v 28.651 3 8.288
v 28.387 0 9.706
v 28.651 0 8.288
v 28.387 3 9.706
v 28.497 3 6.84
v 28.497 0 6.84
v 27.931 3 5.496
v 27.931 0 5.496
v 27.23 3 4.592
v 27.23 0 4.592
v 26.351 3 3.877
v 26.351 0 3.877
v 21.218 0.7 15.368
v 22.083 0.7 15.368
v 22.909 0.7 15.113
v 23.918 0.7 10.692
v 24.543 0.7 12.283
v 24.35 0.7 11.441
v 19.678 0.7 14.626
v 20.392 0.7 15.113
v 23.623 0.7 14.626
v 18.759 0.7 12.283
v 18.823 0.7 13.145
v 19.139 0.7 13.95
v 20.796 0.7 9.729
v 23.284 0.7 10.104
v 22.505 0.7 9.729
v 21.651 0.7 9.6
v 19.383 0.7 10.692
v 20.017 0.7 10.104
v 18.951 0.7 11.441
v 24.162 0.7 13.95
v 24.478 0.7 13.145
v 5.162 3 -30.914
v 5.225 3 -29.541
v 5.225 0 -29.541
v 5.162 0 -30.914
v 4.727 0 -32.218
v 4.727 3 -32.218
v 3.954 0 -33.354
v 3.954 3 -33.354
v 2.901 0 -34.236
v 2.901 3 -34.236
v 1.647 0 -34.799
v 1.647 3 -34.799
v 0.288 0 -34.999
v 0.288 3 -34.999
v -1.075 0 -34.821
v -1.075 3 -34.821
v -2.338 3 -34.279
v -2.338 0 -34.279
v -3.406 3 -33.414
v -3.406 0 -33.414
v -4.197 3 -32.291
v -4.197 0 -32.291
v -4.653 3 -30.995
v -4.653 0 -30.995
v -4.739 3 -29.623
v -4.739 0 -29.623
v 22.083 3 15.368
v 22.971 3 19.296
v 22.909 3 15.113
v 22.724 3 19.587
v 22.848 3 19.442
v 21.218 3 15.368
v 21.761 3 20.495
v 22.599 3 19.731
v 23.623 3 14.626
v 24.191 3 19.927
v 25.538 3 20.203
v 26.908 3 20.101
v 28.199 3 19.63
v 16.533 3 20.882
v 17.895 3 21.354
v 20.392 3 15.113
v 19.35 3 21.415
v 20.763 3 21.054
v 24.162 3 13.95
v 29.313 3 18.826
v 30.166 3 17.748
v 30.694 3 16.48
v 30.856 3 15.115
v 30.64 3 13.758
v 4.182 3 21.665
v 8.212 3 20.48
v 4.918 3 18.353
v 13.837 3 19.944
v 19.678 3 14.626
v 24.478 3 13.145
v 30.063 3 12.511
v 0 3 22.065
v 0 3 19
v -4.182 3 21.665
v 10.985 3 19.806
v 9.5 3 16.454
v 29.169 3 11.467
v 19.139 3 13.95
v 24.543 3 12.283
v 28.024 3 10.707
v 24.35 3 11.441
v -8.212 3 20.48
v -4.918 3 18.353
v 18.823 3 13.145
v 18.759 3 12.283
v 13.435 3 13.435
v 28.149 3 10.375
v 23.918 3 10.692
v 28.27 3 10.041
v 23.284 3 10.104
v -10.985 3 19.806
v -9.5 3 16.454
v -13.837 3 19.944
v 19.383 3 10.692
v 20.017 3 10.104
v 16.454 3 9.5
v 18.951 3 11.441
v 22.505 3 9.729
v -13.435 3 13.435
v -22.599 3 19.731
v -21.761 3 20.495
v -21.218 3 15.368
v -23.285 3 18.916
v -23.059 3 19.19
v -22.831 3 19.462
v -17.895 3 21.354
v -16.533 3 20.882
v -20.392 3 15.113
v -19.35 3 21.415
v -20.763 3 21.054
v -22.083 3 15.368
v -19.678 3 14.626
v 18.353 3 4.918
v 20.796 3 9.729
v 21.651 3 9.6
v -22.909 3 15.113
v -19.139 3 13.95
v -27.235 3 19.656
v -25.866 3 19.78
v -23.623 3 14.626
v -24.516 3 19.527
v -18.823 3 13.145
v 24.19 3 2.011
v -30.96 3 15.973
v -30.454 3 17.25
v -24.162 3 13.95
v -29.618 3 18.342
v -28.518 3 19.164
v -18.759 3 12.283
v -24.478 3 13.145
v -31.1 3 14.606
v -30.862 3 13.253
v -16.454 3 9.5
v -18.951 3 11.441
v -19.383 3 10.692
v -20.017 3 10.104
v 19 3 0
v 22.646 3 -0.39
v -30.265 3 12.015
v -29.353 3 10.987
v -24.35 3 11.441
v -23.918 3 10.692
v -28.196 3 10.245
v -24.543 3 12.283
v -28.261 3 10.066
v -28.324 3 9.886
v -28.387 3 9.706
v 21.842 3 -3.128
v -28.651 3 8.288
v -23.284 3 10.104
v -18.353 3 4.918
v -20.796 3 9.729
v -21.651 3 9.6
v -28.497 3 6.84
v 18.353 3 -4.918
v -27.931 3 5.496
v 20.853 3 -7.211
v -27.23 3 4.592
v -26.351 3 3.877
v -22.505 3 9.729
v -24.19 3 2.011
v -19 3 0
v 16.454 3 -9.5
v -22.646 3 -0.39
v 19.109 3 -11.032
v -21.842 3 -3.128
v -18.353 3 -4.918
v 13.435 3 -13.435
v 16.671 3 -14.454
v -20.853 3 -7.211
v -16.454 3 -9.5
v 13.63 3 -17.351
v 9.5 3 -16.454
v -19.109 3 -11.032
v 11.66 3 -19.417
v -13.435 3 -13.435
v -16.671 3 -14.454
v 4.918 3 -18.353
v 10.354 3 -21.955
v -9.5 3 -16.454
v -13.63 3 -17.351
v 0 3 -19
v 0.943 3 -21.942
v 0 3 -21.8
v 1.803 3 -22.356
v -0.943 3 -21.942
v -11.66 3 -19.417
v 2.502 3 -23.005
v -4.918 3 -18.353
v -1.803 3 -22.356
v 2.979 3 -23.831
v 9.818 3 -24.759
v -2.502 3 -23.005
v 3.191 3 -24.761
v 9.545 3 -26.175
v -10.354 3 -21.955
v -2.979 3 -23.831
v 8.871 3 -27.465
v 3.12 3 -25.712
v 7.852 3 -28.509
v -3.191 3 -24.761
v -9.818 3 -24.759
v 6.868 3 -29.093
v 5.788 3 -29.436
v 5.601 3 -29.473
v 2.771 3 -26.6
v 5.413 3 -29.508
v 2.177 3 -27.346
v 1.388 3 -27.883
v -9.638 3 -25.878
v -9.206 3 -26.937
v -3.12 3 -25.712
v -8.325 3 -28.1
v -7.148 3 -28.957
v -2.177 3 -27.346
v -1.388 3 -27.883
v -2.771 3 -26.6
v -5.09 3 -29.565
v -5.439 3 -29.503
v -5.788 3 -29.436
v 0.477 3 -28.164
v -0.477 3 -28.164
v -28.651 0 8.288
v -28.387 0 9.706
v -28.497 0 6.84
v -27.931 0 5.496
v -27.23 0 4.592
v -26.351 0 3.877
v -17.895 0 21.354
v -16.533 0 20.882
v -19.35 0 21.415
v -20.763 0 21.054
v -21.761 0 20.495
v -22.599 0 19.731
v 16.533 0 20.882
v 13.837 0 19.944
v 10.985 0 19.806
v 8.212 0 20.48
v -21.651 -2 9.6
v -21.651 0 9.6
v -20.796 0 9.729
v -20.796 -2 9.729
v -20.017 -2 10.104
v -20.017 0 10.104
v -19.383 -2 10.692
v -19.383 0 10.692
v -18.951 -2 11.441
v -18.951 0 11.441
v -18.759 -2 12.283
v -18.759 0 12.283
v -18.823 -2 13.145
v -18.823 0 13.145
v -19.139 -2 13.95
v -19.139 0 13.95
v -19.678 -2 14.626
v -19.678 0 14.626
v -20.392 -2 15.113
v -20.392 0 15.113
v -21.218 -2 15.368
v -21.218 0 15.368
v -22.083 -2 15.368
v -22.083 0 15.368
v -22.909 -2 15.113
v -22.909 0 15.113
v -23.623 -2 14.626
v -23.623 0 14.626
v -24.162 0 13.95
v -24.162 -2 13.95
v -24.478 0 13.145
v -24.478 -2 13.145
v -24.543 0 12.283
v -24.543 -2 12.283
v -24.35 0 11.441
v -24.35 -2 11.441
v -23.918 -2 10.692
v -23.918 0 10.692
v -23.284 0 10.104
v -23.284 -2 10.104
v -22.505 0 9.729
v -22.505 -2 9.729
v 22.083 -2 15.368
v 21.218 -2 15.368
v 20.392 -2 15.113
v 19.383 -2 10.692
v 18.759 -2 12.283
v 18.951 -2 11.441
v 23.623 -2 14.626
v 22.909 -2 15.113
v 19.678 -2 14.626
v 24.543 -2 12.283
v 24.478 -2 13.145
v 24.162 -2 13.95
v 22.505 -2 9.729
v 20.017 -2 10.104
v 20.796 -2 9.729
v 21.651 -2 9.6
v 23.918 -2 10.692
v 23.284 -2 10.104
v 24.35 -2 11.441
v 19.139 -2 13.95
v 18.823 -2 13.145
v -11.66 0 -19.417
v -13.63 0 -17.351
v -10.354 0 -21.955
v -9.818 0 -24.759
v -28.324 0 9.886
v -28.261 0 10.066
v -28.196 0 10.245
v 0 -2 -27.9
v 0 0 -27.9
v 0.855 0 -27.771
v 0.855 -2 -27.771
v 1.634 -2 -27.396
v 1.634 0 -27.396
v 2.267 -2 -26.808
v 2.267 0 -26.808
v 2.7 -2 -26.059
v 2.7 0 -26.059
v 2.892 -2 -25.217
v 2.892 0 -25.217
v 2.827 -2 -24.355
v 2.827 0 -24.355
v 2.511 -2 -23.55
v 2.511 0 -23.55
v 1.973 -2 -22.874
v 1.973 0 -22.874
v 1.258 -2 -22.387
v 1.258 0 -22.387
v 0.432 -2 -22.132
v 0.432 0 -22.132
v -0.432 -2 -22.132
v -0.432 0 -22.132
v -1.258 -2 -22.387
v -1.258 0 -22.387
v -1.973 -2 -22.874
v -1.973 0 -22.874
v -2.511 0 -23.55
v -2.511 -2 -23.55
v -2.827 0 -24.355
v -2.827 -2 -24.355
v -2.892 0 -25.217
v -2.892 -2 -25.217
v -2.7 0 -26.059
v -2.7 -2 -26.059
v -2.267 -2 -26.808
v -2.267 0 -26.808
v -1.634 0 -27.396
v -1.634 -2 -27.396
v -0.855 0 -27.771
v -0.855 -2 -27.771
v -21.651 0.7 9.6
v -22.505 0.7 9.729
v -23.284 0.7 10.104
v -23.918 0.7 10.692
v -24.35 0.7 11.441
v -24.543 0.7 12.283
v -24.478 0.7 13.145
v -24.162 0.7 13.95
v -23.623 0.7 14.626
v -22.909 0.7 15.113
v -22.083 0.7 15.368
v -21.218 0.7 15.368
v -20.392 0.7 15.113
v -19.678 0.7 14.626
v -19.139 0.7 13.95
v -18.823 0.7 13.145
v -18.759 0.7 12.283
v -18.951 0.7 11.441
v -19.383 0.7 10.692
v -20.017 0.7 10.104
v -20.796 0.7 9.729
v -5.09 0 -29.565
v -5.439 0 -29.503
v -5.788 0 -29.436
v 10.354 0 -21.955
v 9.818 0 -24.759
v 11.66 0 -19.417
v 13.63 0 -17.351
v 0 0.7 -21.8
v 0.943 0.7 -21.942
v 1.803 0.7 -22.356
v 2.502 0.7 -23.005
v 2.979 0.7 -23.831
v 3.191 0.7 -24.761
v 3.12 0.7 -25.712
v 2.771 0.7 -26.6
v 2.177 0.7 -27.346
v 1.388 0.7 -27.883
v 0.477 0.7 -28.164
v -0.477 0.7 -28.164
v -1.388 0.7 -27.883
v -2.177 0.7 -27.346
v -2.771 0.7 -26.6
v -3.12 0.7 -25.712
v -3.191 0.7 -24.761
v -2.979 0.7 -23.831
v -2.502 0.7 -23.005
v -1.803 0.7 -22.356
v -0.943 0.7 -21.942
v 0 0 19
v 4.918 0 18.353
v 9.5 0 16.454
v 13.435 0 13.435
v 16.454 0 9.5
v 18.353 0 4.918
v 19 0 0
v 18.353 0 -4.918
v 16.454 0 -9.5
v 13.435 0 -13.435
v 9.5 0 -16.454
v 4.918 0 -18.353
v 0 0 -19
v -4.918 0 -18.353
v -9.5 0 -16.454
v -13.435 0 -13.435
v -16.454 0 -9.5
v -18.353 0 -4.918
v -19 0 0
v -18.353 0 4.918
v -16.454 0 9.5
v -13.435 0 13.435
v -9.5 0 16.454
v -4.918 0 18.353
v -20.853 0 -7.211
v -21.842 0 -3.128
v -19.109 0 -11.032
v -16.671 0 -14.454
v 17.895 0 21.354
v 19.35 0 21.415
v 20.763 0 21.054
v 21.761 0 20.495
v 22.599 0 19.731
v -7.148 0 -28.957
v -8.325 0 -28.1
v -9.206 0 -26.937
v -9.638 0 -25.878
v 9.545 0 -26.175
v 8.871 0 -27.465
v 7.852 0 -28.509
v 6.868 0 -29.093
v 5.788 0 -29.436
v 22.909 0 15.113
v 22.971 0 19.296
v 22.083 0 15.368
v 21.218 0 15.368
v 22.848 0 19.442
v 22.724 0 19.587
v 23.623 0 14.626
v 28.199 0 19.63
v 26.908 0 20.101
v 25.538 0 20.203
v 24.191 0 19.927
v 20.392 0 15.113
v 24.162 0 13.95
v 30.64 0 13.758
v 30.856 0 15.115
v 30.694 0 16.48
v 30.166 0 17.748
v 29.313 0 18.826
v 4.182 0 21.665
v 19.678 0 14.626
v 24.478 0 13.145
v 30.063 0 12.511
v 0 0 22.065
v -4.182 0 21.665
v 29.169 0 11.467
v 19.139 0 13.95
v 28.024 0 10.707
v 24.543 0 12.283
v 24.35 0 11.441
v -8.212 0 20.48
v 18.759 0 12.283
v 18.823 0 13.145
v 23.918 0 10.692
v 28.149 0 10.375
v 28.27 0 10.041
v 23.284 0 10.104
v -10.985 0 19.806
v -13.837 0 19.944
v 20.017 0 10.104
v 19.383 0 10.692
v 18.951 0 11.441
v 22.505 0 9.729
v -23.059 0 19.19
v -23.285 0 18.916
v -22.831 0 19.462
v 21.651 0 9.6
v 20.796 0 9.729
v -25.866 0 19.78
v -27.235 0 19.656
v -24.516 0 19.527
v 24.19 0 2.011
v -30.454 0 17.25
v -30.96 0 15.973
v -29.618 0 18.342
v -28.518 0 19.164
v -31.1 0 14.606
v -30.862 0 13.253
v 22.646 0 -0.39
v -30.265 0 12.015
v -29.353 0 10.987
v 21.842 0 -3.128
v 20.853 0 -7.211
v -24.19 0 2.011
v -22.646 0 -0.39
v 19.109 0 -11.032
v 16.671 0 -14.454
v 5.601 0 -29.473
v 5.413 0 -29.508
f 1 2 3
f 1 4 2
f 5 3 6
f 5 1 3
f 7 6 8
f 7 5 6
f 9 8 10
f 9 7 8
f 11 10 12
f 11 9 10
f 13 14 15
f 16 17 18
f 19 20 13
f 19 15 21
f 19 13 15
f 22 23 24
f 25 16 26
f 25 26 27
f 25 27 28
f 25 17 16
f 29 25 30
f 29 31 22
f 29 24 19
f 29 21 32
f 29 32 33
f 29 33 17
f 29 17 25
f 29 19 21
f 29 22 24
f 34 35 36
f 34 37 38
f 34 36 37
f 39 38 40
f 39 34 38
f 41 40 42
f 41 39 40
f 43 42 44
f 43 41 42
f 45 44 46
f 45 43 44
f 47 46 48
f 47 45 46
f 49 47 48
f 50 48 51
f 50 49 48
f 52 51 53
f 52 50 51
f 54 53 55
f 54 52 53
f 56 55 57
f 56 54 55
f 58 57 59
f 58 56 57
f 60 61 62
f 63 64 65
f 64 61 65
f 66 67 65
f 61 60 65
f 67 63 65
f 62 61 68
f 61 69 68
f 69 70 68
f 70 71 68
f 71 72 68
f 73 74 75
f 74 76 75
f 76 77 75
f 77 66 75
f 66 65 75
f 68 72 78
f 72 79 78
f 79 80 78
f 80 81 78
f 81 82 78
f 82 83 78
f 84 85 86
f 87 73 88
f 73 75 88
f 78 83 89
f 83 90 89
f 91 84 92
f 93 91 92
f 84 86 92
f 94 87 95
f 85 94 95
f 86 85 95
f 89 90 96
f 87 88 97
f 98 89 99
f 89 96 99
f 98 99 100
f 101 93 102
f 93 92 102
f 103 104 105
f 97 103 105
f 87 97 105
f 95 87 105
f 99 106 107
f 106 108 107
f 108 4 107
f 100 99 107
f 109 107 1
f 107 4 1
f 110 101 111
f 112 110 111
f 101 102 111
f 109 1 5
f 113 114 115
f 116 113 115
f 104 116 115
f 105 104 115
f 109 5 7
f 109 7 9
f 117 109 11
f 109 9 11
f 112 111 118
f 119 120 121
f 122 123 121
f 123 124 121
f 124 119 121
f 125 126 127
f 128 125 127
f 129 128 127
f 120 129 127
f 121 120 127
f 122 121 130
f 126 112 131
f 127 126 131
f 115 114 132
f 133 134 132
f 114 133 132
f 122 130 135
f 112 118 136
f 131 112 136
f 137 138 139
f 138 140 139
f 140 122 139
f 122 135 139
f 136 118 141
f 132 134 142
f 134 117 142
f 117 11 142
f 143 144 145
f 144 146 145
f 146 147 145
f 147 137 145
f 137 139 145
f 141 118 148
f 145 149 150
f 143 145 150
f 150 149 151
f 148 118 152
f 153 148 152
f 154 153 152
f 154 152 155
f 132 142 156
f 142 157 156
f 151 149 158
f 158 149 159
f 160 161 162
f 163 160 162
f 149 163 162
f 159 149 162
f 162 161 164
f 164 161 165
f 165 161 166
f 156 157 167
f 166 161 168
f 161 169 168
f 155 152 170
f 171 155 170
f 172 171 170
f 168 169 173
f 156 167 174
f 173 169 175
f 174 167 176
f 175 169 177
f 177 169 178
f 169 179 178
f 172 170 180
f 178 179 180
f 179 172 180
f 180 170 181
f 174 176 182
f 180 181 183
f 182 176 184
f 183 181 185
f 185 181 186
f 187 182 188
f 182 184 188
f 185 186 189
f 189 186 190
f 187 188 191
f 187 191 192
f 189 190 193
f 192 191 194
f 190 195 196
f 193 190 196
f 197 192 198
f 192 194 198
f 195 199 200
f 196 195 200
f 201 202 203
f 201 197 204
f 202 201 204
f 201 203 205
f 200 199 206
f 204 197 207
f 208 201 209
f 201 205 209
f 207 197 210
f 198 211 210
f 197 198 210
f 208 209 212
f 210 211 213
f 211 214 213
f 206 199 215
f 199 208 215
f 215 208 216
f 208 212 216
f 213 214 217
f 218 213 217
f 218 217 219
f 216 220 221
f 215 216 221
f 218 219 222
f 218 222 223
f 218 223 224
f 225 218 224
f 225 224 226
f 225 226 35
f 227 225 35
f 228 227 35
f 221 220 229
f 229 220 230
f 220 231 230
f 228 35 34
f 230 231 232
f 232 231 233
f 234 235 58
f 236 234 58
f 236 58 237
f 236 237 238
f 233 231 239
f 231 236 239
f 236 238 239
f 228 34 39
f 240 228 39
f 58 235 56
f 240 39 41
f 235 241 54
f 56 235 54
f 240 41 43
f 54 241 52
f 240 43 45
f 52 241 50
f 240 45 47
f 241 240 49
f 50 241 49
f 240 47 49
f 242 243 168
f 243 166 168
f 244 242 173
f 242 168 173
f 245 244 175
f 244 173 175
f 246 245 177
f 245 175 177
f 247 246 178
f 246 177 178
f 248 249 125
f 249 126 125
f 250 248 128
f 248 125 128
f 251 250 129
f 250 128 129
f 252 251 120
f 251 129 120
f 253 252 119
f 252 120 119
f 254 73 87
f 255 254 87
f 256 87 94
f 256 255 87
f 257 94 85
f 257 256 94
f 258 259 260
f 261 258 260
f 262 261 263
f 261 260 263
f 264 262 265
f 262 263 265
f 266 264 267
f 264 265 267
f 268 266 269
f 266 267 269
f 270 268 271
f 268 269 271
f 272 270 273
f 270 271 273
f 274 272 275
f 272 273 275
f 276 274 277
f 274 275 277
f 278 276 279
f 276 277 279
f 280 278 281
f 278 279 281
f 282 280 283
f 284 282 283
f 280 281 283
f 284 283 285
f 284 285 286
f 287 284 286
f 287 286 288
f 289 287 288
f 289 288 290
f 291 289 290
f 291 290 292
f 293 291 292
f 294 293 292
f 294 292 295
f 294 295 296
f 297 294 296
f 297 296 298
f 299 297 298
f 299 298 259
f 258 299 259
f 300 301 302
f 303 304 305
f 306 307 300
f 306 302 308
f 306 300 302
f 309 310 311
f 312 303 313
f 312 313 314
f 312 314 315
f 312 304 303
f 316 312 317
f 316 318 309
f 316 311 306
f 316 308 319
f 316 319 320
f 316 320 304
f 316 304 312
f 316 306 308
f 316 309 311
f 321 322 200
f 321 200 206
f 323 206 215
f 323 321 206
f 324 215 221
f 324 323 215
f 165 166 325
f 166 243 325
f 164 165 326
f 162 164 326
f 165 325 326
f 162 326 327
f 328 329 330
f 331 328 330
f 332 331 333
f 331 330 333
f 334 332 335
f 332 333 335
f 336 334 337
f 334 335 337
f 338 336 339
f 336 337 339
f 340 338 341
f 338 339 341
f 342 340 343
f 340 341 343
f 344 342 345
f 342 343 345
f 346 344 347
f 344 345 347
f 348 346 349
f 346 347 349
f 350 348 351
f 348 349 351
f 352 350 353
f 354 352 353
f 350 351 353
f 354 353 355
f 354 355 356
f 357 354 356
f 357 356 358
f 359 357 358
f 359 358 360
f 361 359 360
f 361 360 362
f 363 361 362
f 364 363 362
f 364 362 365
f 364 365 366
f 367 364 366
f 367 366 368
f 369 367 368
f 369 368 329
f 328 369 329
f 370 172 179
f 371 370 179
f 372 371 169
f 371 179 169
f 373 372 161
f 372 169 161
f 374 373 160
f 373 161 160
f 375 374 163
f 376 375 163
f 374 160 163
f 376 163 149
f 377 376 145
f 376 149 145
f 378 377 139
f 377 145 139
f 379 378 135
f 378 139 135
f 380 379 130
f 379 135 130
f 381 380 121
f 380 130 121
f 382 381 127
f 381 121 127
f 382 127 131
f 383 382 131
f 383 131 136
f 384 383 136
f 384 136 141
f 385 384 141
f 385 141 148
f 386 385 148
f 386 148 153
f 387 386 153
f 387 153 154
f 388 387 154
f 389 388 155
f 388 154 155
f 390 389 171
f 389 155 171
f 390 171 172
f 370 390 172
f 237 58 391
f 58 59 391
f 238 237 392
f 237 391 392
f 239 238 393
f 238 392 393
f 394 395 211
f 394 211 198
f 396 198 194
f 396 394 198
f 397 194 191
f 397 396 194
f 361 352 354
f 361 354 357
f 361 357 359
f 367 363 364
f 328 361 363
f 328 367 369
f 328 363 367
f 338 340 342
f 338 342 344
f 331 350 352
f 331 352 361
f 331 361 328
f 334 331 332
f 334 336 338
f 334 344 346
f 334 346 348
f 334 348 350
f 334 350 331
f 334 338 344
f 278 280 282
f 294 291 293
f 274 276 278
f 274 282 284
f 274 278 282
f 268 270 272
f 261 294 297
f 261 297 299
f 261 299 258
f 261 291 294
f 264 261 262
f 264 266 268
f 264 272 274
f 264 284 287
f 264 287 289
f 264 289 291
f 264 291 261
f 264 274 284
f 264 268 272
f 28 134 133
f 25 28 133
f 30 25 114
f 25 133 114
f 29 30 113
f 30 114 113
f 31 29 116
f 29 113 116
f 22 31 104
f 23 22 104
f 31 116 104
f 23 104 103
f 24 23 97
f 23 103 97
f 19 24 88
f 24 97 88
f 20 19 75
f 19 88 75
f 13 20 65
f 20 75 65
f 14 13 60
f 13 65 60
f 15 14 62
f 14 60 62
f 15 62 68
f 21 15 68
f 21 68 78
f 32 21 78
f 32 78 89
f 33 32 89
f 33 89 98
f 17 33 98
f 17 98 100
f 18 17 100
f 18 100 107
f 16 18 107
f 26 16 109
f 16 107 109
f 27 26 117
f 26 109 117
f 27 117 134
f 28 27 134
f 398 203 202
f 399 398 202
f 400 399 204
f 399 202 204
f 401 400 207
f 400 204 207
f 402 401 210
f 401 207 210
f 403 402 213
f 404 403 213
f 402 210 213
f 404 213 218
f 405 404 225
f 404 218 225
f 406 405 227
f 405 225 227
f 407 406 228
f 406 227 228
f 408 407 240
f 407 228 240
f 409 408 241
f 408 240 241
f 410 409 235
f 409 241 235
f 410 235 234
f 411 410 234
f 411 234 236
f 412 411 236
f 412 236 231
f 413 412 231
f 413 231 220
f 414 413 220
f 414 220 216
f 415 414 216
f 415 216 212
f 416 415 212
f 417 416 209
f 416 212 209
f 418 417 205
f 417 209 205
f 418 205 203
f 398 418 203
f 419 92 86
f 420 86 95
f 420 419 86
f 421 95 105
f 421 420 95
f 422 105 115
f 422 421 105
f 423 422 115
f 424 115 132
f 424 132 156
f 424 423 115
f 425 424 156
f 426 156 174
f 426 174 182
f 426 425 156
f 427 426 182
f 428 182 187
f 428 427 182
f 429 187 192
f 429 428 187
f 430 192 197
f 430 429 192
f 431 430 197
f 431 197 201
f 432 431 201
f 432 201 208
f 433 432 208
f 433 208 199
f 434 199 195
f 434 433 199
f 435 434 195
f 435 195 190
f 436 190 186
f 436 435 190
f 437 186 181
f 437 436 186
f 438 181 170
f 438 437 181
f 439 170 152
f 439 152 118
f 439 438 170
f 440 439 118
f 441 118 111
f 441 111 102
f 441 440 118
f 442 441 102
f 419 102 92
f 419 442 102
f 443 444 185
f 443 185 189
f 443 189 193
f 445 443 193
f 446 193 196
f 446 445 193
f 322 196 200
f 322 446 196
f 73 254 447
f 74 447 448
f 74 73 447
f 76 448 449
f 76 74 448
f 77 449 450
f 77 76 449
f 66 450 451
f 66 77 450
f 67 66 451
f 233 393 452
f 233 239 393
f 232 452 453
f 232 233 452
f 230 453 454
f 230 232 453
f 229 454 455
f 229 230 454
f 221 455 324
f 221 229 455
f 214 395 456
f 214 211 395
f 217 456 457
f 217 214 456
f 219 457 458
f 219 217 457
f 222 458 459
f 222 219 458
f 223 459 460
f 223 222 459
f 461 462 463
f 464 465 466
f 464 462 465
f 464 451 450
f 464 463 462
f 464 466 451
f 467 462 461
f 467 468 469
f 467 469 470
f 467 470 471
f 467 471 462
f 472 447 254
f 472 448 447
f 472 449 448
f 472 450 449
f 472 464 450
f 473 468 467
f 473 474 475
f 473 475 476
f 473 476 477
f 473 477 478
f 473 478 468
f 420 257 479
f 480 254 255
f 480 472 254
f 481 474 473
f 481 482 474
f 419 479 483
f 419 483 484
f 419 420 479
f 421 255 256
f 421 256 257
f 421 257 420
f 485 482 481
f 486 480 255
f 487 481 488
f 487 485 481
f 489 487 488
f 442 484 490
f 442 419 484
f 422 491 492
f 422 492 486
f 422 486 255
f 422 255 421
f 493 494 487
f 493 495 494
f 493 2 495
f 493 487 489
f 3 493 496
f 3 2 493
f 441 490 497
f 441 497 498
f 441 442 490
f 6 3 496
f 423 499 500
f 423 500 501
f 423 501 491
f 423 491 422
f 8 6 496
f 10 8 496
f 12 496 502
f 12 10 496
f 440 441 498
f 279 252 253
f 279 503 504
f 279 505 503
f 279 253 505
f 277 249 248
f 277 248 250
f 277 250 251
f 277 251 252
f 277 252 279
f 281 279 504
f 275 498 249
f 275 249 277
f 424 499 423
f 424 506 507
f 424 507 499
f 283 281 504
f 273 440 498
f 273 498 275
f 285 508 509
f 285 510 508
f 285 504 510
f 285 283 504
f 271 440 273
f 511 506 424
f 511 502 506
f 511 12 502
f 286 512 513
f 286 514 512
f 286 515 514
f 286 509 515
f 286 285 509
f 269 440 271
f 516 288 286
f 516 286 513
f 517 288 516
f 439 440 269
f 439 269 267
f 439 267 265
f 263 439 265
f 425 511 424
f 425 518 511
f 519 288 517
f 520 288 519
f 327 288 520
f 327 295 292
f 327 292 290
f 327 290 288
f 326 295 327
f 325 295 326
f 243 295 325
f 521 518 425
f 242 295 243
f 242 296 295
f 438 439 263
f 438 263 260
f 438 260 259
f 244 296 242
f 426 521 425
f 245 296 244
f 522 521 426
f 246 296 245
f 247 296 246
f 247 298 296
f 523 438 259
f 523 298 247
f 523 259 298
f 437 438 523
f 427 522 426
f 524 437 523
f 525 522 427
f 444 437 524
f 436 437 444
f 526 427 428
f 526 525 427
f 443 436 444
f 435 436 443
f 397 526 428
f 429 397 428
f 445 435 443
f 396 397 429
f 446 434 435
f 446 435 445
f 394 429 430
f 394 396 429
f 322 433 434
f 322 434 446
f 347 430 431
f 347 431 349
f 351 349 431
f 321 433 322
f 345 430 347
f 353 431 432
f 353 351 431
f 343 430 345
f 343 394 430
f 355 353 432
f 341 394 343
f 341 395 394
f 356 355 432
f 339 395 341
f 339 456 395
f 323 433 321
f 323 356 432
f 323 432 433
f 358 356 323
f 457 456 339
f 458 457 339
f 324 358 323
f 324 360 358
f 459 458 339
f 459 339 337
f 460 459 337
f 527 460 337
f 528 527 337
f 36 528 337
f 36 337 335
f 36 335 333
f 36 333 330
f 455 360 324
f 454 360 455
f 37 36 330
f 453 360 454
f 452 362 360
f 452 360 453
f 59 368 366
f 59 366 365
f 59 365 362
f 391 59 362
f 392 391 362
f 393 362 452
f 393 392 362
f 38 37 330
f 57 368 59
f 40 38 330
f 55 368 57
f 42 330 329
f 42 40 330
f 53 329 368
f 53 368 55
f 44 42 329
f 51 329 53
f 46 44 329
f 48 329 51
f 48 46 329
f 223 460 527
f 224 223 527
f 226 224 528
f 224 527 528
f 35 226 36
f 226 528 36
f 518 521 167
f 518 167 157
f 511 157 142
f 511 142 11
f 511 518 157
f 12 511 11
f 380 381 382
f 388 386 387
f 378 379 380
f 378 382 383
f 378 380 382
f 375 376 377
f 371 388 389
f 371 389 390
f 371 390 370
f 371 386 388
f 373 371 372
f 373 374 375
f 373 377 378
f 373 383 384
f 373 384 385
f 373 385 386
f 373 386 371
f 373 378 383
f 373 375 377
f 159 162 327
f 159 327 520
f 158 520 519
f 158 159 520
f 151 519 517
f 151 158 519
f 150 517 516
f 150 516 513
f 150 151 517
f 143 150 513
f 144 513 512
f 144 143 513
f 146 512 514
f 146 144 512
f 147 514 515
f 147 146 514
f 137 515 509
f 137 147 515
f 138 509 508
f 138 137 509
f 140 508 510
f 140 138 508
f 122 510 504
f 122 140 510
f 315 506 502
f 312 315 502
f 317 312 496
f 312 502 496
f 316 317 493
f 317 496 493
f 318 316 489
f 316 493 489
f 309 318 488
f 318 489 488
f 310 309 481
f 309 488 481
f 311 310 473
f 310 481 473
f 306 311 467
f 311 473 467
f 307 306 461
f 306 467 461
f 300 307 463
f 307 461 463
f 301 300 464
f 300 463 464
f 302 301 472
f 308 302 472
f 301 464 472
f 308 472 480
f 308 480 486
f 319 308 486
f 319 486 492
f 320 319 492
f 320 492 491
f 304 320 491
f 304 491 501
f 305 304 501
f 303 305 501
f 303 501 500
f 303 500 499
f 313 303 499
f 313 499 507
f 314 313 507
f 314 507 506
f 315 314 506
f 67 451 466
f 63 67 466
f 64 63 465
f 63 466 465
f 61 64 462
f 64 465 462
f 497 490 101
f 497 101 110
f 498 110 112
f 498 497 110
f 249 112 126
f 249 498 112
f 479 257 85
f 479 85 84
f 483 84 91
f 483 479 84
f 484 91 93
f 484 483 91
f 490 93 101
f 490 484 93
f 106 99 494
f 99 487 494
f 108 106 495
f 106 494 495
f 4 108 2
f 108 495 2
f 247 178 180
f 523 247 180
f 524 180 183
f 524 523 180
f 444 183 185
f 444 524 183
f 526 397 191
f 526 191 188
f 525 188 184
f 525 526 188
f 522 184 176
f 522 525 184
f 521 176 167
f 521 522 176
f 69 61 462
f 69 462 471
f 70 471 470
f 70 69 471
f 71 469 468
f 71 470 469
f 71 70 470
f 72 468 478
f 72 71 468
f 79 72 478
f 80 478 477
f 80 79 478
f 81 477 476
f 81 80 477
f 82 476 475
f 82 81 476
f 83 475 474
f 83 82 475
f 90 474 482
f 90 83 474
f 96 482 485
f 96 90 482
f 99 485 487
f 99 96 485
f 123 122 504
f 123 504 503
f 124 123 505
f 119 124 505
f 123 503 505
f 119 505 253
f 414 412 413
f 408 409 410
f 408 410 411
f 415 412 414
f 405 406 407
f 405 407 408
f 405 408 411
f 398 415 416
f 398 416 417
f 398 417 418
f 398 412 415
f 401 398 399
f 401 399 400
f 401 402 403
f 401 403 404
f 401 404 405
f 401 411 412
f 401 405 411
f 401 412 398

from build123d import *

# Parameters (mm, degrees)
SKETCH1_R                = 19
BOSS_EXTRUDE1_DEPTH      = 3.5
SKETCH2_R                = 30
SKETCH2_R_2              = 19
SKETCH2_R_3              = 2.8
BOSS_EXTRUDE2_DEPTH      = 3
BOSS_EXTRUDE3_DEPTH      = 2
BOSS_EXTRUDE3_DEPTH_BACK = 3
SKETCH4_R                = 2.9
SKETCH5_R                = 5
BOSS_EXTRUDE4_DEPTH      = 3
CUT_EXTRUDE1_START       = -10
SKETCH3_R                = 19
CUT_EXTRUDE1_DEPTH       = 10
SKETCH6_R                = 3.2
SKETCH6_R_2              = 2.9
CUT_EXTRUDE2_DEPTH       = 2.3
CUT_EXTRUDE3_START       = -13
CUT_EXTRUDE3_DEPTH       = 13
FILLET1_R                = 10
FILLET2_R                = 5


with BuildPart() as part:
    # Sketch1 → Boss-Extrude1 (new body)
    with BuildSketch(Plane(origin=(0, 0, 0), x_dir=(1, 0, 0), z_dir=(0, 1, 0))):
        with Locations(Location((0, 0, 0), (0, 0, 270))):
            Circle(SKETCH1_R)
    extrude(amount=BOSS_EXTRUDE1_DEPTH)

    # Sketch2 → Boss-Extrude2 (add)
    with BuildSketch(Plane(origin=(0, 0, 0), x_dir=(1, 0, 0), z_dir=(0, 1, 0))):
        with Locations(Location((0, 0, 0), (0, 0, 270))):
            Circle(SKETCH2_R)
        with Locations(Location((0, 0, 0), (0, 0, 270))):
            Circle(SKETCH2_R_2, mode=Mode.SUBTRACT)
        with Locations(Location((0, 25, 0), (0, 0, 270))):
            Circle(SKETCH2_R_3, mode=Mode.SUBTRACT)
        with Locations(Location((21.650635095, -12.5, 0), (0, 0, 270))):
            Circle(SKETCH2_R_3, mode=Mode.SUBTRACT)
        with Locations(Location((-21.650635095, -12.5, 0), (0, 0, 270))):
            Circle(SKETCH2_R_3, mode=Mode.SUBTRACT)
    extrude(amount=BOSS_EXTRUDE2_DEPTH)

    # Sketch4 → Boss-Extrude3 (add, two sides: drawn at the far end of the back side and taken through both)
    with BuildSketch(Plane.XZ.offset(-BOSS_EXTRUDE3_DEPTH_BACK)):
        with Locations(Location((-21.650635095, 12.5, 0), (0, 0, 270))):
            Circle(SKETCH4_R)
        with Locations(Location((21.650635095, 12.5, 0), (0, 0, 270))):
            Circle(SKETCH4_R)
        with Locations(Location((0, -25, 0), (0, 0, 270))):
            Circle(SKETCH4_R)
    extrude(amount=BOSS_EXTRUDE3_DEPTH + BOSS_EXTRUDE3_DEPTH_BACK)

    # Sketch5 → Boss-Extrude4 (add)
    with BuildSketch(Plane(origin=(0, 3, 0), x_dir=(1, 0, 0), z_dir=(0, 1, 0))):
        with Locations((-26.103110985, -14.7860609)):
            Circle(SKETCH5_R)
        with Locations((0.246451131, 29.99898768)):
            Circle(SKETCH5_R)
        with Locations((25.856659853, -15.212926781)):
            Circle(SKETCH5_R)
    extrude(amount=-BOSS_EXTRUDE4_DEPTH)

    # Sketch3 → Cut-Extrude1 (cut)
    with BuildSketch(Plane(origin=(0, 3.5, 0), x_dir=(1, 0, 0), z_dir=(0, 1, 0)).offset(CUT_EXTRUDE1_START)):
        with Locations(Location((0, 0, 0), (0, 0, 270))):
            Circle(SKETCH3_R)
    extrude(amount=CUT_EXTRUDE1_DEPTH, mode=Mode.SUBTRACT)

    # Sketch6 → Cut-Extrude2 (cut)
    with BuildSketch(Plane(origin=(0, 3, 0), x_dir=(1, 0, 0), z_dir=(0, 1, 0))):
        with Locations(Location((0, 25, 0), (0, 0, 270))):
            Circle(SKETCH6_R)
        with Locations(Location((21.650635095, -12.5, 0), (0, 0, 90))):
            Circle(SKETCH6_R_2)
        with Locations(Location((-21.650635095, -12.5, 0), (0, 0, 90))):
            Circle(SKETCH6_R_2)
    extrude(amount=-CUT_EXTRUDE2_DEPTH, mode=Mode.SUBTRACT)

    # Sketch7 → Cut-Extrude3 (cut)
    with BuildSketch(Plane(origin=(0, 3, 0), x_dir=(1, 0, 0), z_dir=(0, 1, 0)).offset(CUT_EXTRUDE3_START)):
        with BuildLine():
            ThreePointArc((-29.54423259, -5.20944533), (-25.980762114, 15), (-10.2606043, 28.190778624))
            Line((-10.2606043, 28.190778624), (-13.773984089, 37.84371026))
            Line((-13.773984089, 37.84371026), (-43.939319858, -7.747687605))
            Line((-43.939319858, -7.747687605), (-29.54423259, -5.20944533))
        make_face()
        with BuildLine():
            ThreePointArc((-21.729408673, -3.831481024), (-19.108521295, 11.032309914), (-7.546544436, 20.733960432))
            Line((-7.546544436, 20.733960432), (-10.2606043, 28.190778624))
            ThreePointArc((-10.2606043, 28.190778624), (-25.980762114, 15), (-29.54423259, -5.20944533))
            Line((-29.54423259, -5.20944533), (-21.729408673, -3.831481024))
        make_face()
        with BuildLine():
            Line((15.259965643, 41.926411025), (10.2606043, 28.190778624))
            ThreePointArc((10.2606043, 28.190778624), (25.980762114, 15), (29.54423259, -5.20944533))
            Line((29.54423259, -5.20944533), (39.660606503, -6.993234998))
            Line((39.660606503, -6.993234998), (15.259965643, 41.926411025))
        make_face()
        with BuildLine():
            Line((10.2606043, 28.190778624), (7.546544436, 20.733960432))
            ThreePointArc((7.546544436, 20.733960432), (18.074278438, 12.65574601), (22.064619828, 0))
            ThreePointArc((22.064619828, 0), (21.980657288, -1.92305833), (21.729408673, -3.831481024))
            Line((21.729408673, -3.831481024), (29.54423259, -5.20944533))
            ThreePointArc((29.54423259, -5.20944533), (25.980762114, 15), (10.2606043, 28.190778624))
        make_face()
        with BuildLine():
            Line((28.679354216, -34.17872342), (19.283628291, -22.981333294))
            ThreePointArc((19.283628291, -22.981333294), (0, -30), (-19.283628291, -22.981333294))
            Line((-19.283628291, -22.981333294), (-25.886622414, -30.850475262))
            Line((-25.886622414, -30.850475262), (28.679354216, -34.17872342))
        make_face()
        with BuildLine():
            Line((19.283628291, -22.981333294), (14.182864238, -16.902479408))
            ThreePointArc((14.182864238, -16.902479408), (0, -22.064619828), (-14.182864238, -16.902479408))
            Line((-14.182864238, -16.902479408), (-19.283628291, -22.981333294))
            ThreePointArc((-19.283628291, -22.981333294), (0, -30), (19.283628291, -22.981333294))
        make_face()
    extrude(amount=CUT_EXTRUDE3_DEPTH, mode=Mode.SUBTRACT)

    # Fillet1
    # the kernel refuses this fillet: 10 mm, written as the material it adds along each edge
    with BuildSketch(Plane(origin=(-21.729408673, 0, 3.831481024), x_dir=(-0.9848077530122133, 0, 0.17364817766690055), z_dir=(0, 1, 0)), Plane(origin=(14.182864238, 0, 16.902479408), x_dir=(0.6427876096865253, 0, 0.7660444431189899), z_dir=(0, 1, 0)), Plane(origin=(7.546544436, 0, -20.733960432), x_dir=(0.34202014332569675, 0, -0.9396926207858982), z_dir=(0, 1, 0))) as fillet1_piece_1:
        with BuildLine():
            CenterArc((8.404377584, -9.988996017), FILLET1_R, 92.688143309, 69.160575724)
            Line((-1.097995304, -6.873725644), (-1.288042762, -6.811420237))
            ThreePointArc((-1.288042762, -6.811420237), (-0.473724072, -3.448886874), (-0.2, 0))
            Line((-0.2, 0), (0, 0.2))
            ThreePointArc((0, 0.2), (3.967690086, 0.2), (7.926000224, 0.19977992))
            Line((7.926000224, 0.19977992), (7.935380172, 0))
        make_face()
    extrude(amount=3)
    with BuildSketch(Plane(origin=(-14.182864238, 0, 16.902479408), x_dir=(0.8578464941811706, 0, 0.5139060151633514), z_dir=(0, 1, 0)), Plane(origin=(21.729408673, 0, 3.831481024), x_dir=(0.01613241719851076, 0, -0.9998698640899891), z_dir=(0, 1, 0)), Plane(origin=(-7.546544436, 0, -20.733960432), x_dir=(-0.8739789113796794, 0, 0.48596384892663586), z_dir=(0, 1, 0))) as fillet1_piece_2:
        with BuildLine():
            CenterArc((8.538251552, -9.87480959), FILLET1_R, 99.075640483, 69.160575724)
            Line((-1.251712984, -7.836036823), (-1.447512274, -7.795261367))
            ThreePointArc((-1.447512274, -7.795261367), (-0.823352684, -3.886470761), (-0.197496192, 0.03154765))
            Line((-0.197496192, 0.03154765), (0.03154765, 0.197496192))
            ThreePointArc((0.03154765, 0.197496192), (3.480434524, -0.07622788), (6.929321399, 0.197496192))
            Line((6.929321399, 0.197496192), (6.960869049, 0))
        make_face()
    extrude(amount=3)

    # Fillet2
    fillet2_edges = [part.edges().sort_by_distance(p)[0] for p in [
        (-19.283628291, 1.5, 22.981333294),
        (19.283628291, 1.5, 22.981333294),
        (29.54423259, 1.5, 5.20944533),
        (10.2606043, 1.5, -28.190778624),
        (-10.2606043, 1.5, -28.190778624),
        (-29.54423259, 1.5, 5.20944533),
    ]]
    fillet(fillet2_edges, radius=FILLET2_R)


solid = part.part
